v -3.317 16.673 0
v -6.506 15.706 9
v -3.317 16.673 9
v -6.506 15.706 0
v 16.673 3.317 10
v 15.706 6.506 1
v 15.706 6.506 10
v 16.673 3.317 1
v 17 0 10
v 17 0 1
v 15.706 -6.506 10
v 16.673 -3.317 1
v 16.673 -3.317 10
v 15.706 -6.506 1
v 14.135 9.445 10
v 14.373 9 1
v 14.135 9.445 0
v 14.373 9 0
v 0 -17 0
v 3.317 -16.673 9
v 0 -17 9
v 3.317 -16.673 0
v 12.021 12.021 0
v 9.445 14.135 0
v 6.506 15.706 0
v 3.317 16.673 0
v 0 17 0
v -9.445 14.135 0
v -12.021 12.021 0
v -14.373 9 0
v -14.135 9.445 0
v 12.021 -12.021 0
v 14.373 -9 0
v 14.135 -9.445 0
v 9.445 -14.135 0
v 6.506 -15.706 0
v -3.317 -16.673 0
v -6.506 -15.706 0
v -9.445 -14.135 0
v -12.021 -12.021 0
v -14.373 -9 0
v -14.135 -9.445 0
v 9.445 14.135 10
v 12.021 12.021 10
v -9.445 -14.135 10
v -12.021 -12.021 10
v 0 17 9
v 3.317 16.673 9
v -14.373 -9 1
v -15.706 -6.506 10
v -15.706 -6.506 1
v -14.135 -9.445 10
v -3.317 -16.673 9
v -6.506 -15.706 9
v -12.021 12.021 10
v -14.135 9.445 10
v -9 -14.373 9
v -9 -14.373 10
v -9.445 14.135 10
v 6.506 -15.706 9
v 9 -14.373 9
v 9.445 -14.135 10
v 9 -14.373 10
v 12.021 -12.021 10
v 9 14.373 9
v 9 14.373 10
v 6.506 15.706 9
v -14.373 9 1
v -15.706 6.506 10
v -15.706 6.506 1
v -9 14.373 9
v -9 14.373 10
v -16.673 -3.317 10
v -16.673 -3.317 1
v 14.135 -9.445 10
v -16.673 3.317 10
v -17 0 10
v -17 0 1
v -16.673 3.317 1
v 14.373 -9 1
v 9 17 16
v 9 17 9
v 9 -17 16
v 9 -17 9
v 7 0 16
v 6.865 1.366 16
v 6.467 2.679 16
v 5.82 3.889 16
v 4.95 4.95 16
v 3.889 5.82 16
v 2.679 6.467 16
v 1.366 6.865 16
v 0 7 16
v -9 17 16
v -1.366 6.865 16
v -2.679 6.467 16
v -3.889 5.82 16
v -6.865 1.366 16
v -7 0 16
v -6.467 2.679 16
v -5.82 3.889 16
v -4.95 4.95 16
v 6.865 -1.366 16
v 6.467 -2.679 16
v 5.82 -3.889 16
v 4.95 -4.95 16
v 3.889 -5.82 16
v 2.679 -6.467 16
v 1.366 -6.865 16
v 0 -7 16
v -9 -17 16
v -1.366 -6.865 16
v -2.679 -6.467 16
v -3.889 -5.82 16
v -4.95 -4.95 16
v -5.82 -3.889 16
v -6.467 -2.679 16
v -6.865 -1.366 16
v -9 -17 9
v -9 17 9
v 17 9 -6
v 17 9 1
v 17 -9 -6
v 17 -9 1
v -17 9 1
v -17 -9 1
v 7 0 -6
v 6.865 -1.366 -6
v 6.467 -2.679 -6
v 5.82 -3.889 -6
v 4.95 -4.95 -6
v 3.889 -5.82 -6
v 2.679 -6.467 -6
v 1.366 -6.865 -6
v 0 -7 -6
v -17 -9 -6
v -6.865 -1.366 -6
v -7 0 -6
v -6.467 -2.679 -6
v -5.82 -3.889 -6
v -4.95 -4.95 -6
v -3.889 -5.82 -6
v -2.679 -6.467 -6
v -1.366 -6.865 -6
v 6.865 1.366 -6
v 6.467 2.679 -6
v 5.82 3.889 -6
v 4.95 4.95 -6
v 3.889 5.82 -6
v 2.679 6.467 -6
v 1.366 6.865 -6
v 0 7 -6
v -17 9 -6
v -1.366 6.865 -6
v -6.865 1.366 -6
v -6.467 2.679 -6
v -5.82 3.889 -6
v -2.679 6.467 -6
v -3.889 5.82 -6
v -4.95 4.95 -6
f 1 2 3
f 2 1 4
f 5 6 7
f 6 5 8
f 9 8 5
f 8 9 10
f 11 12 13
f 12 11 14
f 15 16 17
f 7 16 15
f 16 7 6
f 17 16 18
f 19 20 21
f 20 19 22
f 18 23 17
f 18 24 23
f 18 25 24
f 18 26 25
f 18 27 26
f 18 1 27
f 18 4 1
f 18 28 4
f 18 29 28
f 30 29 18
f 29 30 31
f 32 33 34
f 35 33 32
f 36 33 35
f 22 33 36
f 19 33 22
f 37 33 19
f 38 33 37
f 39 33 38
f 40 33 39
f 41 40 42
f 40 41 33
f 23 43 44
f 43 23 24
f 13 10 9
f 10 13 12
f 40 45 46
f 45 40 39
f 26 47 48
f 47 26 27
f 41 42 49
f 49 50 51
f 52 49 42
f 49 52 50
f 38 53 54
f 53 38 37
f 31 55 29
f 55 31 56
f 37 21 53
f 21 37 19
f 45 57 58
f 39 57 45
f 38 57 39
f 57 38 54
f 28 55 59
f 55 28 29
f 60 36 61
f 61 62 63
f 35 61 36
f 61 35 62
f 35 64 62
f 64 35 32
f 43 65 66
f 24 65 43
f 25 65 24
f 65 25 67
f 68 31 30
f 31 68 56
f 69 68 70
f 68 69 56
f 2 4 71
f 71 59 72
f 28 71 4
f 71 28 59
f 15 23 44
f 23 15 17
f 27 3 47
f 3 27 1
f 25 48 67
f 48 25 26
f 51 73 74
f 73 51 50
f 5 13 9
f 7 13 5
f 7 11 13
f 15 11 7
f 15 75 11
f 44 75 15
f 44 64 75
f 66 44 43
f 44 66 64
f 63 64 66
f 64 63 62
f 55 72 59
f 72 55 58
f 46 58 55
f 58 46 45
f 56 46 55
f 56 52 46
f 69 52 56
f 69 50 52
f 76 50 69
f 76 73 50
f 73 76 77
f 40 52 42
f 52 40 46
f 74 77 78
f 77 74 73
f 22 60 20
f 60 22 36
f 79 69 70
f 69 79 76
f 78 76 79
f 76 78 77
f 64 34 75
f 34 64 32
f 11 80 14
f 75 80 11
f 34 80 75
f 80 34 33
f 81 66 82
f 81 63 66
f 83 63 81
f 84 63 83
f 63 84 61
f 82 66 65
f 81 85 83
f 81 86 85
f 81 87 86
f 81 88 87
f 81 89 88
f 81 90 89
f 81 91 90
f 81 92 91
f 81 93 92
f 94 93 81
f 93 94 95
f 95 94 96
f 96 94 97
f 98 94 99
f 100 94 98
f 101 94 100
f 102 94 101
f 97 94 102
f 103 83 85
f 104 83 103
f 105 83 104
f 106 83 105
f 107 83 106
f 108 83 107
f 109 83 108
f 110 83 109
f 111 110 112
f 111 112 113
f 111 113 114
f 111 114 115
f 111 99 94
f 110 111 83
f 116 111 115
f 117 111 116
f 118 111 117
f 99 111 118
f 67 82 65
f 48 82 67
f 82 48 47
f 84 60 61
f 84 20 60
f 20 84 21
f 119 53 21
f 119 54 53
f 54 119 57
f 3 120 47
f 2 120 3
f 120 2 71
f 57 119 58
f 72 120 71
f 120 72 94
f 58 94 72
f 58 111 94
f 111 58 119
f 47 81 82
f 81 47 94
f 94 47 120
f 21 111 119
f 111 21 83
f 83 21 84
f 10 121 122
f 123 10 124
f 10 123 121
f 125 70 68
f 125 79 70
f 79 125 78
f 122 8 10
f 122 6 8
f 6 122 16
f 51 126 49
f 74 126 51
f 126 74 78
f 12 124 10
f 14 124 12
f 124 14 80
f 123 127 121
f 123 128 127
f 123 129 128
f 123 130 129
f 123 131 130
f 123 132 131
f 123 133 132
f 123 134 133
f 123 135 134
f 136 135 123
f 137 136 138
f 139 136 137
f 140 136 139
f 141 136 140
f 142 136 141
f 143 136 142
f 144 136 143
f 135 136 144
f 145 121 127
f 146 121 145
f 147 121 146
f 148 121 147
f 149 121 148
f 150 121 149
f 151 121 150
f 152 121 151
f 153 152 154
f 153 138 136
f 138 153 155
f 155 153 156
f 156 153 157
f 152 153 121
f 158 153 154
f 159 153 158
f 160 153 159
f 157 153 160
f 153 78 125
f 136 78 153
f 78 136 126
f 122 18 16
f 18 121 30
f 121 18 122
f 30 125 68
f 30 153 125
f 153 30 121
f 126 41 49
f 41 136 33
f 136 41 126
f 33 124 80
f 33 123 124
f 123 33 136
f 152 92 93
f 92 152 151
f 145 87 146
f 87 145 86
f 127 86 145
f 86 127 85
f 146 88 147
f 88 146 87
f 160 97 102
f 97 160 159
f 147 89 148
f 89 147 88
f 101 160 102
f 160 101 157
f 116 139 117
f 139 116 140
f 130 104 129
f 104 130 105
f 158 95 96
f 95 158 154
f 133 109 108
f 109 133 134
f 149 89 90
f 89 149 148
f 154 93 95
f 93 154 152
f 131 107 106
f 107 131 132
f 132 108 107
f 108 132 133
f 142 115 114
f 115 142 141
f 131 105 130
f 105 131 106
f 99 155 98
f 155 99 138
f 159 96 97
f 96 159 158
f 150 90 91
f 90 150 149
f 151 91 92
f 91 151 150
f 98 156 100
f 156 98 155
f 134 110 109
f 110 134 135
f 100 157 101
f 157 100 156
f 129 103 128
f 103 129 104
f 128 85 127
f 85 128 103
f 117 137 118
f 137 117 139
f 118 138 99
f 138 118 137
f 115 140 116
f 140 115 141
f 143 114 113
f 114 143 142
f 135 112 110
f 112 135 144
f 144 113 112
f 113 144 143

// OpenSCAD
$fn = 32;

// ----------------------------------------------------------------------
// Oldham coupling disc: 34 x 22 mm
// ----------------------------------------------------------------------

// --- parameters (mm) ---
disc_d = 34;              // disc diameter
disc_t = 10;              // disc thickness
tongue_w = 18;            // tongue width
tongue_h = 6;             // tongue height
bore_d = 14;              // centre lightening bore

module disc() {
  cylinder(h = disc_t, d = disc_d);
  /* tongue on the top face, sunk 1 mm into the disc */
  translate([-tongue_w / 2, -disc_d / 2, disc_t - 1]) cube([tongue_w, disc_d, tongue_h + 1]);
  /* slot wall on the bottom face, 90 degrees turned */
  translate([-disc_d / 2, -tongue_w / 2, -tongue_h]) cube([disc_d, tongue_w, tongue_h + 1]);
}

difference() {
  disc();
  translate([0, 0, -tongue_h - 1]) cylinder(h = disc_t + 2 * tongue_h + 2, d = bore_d);
}
